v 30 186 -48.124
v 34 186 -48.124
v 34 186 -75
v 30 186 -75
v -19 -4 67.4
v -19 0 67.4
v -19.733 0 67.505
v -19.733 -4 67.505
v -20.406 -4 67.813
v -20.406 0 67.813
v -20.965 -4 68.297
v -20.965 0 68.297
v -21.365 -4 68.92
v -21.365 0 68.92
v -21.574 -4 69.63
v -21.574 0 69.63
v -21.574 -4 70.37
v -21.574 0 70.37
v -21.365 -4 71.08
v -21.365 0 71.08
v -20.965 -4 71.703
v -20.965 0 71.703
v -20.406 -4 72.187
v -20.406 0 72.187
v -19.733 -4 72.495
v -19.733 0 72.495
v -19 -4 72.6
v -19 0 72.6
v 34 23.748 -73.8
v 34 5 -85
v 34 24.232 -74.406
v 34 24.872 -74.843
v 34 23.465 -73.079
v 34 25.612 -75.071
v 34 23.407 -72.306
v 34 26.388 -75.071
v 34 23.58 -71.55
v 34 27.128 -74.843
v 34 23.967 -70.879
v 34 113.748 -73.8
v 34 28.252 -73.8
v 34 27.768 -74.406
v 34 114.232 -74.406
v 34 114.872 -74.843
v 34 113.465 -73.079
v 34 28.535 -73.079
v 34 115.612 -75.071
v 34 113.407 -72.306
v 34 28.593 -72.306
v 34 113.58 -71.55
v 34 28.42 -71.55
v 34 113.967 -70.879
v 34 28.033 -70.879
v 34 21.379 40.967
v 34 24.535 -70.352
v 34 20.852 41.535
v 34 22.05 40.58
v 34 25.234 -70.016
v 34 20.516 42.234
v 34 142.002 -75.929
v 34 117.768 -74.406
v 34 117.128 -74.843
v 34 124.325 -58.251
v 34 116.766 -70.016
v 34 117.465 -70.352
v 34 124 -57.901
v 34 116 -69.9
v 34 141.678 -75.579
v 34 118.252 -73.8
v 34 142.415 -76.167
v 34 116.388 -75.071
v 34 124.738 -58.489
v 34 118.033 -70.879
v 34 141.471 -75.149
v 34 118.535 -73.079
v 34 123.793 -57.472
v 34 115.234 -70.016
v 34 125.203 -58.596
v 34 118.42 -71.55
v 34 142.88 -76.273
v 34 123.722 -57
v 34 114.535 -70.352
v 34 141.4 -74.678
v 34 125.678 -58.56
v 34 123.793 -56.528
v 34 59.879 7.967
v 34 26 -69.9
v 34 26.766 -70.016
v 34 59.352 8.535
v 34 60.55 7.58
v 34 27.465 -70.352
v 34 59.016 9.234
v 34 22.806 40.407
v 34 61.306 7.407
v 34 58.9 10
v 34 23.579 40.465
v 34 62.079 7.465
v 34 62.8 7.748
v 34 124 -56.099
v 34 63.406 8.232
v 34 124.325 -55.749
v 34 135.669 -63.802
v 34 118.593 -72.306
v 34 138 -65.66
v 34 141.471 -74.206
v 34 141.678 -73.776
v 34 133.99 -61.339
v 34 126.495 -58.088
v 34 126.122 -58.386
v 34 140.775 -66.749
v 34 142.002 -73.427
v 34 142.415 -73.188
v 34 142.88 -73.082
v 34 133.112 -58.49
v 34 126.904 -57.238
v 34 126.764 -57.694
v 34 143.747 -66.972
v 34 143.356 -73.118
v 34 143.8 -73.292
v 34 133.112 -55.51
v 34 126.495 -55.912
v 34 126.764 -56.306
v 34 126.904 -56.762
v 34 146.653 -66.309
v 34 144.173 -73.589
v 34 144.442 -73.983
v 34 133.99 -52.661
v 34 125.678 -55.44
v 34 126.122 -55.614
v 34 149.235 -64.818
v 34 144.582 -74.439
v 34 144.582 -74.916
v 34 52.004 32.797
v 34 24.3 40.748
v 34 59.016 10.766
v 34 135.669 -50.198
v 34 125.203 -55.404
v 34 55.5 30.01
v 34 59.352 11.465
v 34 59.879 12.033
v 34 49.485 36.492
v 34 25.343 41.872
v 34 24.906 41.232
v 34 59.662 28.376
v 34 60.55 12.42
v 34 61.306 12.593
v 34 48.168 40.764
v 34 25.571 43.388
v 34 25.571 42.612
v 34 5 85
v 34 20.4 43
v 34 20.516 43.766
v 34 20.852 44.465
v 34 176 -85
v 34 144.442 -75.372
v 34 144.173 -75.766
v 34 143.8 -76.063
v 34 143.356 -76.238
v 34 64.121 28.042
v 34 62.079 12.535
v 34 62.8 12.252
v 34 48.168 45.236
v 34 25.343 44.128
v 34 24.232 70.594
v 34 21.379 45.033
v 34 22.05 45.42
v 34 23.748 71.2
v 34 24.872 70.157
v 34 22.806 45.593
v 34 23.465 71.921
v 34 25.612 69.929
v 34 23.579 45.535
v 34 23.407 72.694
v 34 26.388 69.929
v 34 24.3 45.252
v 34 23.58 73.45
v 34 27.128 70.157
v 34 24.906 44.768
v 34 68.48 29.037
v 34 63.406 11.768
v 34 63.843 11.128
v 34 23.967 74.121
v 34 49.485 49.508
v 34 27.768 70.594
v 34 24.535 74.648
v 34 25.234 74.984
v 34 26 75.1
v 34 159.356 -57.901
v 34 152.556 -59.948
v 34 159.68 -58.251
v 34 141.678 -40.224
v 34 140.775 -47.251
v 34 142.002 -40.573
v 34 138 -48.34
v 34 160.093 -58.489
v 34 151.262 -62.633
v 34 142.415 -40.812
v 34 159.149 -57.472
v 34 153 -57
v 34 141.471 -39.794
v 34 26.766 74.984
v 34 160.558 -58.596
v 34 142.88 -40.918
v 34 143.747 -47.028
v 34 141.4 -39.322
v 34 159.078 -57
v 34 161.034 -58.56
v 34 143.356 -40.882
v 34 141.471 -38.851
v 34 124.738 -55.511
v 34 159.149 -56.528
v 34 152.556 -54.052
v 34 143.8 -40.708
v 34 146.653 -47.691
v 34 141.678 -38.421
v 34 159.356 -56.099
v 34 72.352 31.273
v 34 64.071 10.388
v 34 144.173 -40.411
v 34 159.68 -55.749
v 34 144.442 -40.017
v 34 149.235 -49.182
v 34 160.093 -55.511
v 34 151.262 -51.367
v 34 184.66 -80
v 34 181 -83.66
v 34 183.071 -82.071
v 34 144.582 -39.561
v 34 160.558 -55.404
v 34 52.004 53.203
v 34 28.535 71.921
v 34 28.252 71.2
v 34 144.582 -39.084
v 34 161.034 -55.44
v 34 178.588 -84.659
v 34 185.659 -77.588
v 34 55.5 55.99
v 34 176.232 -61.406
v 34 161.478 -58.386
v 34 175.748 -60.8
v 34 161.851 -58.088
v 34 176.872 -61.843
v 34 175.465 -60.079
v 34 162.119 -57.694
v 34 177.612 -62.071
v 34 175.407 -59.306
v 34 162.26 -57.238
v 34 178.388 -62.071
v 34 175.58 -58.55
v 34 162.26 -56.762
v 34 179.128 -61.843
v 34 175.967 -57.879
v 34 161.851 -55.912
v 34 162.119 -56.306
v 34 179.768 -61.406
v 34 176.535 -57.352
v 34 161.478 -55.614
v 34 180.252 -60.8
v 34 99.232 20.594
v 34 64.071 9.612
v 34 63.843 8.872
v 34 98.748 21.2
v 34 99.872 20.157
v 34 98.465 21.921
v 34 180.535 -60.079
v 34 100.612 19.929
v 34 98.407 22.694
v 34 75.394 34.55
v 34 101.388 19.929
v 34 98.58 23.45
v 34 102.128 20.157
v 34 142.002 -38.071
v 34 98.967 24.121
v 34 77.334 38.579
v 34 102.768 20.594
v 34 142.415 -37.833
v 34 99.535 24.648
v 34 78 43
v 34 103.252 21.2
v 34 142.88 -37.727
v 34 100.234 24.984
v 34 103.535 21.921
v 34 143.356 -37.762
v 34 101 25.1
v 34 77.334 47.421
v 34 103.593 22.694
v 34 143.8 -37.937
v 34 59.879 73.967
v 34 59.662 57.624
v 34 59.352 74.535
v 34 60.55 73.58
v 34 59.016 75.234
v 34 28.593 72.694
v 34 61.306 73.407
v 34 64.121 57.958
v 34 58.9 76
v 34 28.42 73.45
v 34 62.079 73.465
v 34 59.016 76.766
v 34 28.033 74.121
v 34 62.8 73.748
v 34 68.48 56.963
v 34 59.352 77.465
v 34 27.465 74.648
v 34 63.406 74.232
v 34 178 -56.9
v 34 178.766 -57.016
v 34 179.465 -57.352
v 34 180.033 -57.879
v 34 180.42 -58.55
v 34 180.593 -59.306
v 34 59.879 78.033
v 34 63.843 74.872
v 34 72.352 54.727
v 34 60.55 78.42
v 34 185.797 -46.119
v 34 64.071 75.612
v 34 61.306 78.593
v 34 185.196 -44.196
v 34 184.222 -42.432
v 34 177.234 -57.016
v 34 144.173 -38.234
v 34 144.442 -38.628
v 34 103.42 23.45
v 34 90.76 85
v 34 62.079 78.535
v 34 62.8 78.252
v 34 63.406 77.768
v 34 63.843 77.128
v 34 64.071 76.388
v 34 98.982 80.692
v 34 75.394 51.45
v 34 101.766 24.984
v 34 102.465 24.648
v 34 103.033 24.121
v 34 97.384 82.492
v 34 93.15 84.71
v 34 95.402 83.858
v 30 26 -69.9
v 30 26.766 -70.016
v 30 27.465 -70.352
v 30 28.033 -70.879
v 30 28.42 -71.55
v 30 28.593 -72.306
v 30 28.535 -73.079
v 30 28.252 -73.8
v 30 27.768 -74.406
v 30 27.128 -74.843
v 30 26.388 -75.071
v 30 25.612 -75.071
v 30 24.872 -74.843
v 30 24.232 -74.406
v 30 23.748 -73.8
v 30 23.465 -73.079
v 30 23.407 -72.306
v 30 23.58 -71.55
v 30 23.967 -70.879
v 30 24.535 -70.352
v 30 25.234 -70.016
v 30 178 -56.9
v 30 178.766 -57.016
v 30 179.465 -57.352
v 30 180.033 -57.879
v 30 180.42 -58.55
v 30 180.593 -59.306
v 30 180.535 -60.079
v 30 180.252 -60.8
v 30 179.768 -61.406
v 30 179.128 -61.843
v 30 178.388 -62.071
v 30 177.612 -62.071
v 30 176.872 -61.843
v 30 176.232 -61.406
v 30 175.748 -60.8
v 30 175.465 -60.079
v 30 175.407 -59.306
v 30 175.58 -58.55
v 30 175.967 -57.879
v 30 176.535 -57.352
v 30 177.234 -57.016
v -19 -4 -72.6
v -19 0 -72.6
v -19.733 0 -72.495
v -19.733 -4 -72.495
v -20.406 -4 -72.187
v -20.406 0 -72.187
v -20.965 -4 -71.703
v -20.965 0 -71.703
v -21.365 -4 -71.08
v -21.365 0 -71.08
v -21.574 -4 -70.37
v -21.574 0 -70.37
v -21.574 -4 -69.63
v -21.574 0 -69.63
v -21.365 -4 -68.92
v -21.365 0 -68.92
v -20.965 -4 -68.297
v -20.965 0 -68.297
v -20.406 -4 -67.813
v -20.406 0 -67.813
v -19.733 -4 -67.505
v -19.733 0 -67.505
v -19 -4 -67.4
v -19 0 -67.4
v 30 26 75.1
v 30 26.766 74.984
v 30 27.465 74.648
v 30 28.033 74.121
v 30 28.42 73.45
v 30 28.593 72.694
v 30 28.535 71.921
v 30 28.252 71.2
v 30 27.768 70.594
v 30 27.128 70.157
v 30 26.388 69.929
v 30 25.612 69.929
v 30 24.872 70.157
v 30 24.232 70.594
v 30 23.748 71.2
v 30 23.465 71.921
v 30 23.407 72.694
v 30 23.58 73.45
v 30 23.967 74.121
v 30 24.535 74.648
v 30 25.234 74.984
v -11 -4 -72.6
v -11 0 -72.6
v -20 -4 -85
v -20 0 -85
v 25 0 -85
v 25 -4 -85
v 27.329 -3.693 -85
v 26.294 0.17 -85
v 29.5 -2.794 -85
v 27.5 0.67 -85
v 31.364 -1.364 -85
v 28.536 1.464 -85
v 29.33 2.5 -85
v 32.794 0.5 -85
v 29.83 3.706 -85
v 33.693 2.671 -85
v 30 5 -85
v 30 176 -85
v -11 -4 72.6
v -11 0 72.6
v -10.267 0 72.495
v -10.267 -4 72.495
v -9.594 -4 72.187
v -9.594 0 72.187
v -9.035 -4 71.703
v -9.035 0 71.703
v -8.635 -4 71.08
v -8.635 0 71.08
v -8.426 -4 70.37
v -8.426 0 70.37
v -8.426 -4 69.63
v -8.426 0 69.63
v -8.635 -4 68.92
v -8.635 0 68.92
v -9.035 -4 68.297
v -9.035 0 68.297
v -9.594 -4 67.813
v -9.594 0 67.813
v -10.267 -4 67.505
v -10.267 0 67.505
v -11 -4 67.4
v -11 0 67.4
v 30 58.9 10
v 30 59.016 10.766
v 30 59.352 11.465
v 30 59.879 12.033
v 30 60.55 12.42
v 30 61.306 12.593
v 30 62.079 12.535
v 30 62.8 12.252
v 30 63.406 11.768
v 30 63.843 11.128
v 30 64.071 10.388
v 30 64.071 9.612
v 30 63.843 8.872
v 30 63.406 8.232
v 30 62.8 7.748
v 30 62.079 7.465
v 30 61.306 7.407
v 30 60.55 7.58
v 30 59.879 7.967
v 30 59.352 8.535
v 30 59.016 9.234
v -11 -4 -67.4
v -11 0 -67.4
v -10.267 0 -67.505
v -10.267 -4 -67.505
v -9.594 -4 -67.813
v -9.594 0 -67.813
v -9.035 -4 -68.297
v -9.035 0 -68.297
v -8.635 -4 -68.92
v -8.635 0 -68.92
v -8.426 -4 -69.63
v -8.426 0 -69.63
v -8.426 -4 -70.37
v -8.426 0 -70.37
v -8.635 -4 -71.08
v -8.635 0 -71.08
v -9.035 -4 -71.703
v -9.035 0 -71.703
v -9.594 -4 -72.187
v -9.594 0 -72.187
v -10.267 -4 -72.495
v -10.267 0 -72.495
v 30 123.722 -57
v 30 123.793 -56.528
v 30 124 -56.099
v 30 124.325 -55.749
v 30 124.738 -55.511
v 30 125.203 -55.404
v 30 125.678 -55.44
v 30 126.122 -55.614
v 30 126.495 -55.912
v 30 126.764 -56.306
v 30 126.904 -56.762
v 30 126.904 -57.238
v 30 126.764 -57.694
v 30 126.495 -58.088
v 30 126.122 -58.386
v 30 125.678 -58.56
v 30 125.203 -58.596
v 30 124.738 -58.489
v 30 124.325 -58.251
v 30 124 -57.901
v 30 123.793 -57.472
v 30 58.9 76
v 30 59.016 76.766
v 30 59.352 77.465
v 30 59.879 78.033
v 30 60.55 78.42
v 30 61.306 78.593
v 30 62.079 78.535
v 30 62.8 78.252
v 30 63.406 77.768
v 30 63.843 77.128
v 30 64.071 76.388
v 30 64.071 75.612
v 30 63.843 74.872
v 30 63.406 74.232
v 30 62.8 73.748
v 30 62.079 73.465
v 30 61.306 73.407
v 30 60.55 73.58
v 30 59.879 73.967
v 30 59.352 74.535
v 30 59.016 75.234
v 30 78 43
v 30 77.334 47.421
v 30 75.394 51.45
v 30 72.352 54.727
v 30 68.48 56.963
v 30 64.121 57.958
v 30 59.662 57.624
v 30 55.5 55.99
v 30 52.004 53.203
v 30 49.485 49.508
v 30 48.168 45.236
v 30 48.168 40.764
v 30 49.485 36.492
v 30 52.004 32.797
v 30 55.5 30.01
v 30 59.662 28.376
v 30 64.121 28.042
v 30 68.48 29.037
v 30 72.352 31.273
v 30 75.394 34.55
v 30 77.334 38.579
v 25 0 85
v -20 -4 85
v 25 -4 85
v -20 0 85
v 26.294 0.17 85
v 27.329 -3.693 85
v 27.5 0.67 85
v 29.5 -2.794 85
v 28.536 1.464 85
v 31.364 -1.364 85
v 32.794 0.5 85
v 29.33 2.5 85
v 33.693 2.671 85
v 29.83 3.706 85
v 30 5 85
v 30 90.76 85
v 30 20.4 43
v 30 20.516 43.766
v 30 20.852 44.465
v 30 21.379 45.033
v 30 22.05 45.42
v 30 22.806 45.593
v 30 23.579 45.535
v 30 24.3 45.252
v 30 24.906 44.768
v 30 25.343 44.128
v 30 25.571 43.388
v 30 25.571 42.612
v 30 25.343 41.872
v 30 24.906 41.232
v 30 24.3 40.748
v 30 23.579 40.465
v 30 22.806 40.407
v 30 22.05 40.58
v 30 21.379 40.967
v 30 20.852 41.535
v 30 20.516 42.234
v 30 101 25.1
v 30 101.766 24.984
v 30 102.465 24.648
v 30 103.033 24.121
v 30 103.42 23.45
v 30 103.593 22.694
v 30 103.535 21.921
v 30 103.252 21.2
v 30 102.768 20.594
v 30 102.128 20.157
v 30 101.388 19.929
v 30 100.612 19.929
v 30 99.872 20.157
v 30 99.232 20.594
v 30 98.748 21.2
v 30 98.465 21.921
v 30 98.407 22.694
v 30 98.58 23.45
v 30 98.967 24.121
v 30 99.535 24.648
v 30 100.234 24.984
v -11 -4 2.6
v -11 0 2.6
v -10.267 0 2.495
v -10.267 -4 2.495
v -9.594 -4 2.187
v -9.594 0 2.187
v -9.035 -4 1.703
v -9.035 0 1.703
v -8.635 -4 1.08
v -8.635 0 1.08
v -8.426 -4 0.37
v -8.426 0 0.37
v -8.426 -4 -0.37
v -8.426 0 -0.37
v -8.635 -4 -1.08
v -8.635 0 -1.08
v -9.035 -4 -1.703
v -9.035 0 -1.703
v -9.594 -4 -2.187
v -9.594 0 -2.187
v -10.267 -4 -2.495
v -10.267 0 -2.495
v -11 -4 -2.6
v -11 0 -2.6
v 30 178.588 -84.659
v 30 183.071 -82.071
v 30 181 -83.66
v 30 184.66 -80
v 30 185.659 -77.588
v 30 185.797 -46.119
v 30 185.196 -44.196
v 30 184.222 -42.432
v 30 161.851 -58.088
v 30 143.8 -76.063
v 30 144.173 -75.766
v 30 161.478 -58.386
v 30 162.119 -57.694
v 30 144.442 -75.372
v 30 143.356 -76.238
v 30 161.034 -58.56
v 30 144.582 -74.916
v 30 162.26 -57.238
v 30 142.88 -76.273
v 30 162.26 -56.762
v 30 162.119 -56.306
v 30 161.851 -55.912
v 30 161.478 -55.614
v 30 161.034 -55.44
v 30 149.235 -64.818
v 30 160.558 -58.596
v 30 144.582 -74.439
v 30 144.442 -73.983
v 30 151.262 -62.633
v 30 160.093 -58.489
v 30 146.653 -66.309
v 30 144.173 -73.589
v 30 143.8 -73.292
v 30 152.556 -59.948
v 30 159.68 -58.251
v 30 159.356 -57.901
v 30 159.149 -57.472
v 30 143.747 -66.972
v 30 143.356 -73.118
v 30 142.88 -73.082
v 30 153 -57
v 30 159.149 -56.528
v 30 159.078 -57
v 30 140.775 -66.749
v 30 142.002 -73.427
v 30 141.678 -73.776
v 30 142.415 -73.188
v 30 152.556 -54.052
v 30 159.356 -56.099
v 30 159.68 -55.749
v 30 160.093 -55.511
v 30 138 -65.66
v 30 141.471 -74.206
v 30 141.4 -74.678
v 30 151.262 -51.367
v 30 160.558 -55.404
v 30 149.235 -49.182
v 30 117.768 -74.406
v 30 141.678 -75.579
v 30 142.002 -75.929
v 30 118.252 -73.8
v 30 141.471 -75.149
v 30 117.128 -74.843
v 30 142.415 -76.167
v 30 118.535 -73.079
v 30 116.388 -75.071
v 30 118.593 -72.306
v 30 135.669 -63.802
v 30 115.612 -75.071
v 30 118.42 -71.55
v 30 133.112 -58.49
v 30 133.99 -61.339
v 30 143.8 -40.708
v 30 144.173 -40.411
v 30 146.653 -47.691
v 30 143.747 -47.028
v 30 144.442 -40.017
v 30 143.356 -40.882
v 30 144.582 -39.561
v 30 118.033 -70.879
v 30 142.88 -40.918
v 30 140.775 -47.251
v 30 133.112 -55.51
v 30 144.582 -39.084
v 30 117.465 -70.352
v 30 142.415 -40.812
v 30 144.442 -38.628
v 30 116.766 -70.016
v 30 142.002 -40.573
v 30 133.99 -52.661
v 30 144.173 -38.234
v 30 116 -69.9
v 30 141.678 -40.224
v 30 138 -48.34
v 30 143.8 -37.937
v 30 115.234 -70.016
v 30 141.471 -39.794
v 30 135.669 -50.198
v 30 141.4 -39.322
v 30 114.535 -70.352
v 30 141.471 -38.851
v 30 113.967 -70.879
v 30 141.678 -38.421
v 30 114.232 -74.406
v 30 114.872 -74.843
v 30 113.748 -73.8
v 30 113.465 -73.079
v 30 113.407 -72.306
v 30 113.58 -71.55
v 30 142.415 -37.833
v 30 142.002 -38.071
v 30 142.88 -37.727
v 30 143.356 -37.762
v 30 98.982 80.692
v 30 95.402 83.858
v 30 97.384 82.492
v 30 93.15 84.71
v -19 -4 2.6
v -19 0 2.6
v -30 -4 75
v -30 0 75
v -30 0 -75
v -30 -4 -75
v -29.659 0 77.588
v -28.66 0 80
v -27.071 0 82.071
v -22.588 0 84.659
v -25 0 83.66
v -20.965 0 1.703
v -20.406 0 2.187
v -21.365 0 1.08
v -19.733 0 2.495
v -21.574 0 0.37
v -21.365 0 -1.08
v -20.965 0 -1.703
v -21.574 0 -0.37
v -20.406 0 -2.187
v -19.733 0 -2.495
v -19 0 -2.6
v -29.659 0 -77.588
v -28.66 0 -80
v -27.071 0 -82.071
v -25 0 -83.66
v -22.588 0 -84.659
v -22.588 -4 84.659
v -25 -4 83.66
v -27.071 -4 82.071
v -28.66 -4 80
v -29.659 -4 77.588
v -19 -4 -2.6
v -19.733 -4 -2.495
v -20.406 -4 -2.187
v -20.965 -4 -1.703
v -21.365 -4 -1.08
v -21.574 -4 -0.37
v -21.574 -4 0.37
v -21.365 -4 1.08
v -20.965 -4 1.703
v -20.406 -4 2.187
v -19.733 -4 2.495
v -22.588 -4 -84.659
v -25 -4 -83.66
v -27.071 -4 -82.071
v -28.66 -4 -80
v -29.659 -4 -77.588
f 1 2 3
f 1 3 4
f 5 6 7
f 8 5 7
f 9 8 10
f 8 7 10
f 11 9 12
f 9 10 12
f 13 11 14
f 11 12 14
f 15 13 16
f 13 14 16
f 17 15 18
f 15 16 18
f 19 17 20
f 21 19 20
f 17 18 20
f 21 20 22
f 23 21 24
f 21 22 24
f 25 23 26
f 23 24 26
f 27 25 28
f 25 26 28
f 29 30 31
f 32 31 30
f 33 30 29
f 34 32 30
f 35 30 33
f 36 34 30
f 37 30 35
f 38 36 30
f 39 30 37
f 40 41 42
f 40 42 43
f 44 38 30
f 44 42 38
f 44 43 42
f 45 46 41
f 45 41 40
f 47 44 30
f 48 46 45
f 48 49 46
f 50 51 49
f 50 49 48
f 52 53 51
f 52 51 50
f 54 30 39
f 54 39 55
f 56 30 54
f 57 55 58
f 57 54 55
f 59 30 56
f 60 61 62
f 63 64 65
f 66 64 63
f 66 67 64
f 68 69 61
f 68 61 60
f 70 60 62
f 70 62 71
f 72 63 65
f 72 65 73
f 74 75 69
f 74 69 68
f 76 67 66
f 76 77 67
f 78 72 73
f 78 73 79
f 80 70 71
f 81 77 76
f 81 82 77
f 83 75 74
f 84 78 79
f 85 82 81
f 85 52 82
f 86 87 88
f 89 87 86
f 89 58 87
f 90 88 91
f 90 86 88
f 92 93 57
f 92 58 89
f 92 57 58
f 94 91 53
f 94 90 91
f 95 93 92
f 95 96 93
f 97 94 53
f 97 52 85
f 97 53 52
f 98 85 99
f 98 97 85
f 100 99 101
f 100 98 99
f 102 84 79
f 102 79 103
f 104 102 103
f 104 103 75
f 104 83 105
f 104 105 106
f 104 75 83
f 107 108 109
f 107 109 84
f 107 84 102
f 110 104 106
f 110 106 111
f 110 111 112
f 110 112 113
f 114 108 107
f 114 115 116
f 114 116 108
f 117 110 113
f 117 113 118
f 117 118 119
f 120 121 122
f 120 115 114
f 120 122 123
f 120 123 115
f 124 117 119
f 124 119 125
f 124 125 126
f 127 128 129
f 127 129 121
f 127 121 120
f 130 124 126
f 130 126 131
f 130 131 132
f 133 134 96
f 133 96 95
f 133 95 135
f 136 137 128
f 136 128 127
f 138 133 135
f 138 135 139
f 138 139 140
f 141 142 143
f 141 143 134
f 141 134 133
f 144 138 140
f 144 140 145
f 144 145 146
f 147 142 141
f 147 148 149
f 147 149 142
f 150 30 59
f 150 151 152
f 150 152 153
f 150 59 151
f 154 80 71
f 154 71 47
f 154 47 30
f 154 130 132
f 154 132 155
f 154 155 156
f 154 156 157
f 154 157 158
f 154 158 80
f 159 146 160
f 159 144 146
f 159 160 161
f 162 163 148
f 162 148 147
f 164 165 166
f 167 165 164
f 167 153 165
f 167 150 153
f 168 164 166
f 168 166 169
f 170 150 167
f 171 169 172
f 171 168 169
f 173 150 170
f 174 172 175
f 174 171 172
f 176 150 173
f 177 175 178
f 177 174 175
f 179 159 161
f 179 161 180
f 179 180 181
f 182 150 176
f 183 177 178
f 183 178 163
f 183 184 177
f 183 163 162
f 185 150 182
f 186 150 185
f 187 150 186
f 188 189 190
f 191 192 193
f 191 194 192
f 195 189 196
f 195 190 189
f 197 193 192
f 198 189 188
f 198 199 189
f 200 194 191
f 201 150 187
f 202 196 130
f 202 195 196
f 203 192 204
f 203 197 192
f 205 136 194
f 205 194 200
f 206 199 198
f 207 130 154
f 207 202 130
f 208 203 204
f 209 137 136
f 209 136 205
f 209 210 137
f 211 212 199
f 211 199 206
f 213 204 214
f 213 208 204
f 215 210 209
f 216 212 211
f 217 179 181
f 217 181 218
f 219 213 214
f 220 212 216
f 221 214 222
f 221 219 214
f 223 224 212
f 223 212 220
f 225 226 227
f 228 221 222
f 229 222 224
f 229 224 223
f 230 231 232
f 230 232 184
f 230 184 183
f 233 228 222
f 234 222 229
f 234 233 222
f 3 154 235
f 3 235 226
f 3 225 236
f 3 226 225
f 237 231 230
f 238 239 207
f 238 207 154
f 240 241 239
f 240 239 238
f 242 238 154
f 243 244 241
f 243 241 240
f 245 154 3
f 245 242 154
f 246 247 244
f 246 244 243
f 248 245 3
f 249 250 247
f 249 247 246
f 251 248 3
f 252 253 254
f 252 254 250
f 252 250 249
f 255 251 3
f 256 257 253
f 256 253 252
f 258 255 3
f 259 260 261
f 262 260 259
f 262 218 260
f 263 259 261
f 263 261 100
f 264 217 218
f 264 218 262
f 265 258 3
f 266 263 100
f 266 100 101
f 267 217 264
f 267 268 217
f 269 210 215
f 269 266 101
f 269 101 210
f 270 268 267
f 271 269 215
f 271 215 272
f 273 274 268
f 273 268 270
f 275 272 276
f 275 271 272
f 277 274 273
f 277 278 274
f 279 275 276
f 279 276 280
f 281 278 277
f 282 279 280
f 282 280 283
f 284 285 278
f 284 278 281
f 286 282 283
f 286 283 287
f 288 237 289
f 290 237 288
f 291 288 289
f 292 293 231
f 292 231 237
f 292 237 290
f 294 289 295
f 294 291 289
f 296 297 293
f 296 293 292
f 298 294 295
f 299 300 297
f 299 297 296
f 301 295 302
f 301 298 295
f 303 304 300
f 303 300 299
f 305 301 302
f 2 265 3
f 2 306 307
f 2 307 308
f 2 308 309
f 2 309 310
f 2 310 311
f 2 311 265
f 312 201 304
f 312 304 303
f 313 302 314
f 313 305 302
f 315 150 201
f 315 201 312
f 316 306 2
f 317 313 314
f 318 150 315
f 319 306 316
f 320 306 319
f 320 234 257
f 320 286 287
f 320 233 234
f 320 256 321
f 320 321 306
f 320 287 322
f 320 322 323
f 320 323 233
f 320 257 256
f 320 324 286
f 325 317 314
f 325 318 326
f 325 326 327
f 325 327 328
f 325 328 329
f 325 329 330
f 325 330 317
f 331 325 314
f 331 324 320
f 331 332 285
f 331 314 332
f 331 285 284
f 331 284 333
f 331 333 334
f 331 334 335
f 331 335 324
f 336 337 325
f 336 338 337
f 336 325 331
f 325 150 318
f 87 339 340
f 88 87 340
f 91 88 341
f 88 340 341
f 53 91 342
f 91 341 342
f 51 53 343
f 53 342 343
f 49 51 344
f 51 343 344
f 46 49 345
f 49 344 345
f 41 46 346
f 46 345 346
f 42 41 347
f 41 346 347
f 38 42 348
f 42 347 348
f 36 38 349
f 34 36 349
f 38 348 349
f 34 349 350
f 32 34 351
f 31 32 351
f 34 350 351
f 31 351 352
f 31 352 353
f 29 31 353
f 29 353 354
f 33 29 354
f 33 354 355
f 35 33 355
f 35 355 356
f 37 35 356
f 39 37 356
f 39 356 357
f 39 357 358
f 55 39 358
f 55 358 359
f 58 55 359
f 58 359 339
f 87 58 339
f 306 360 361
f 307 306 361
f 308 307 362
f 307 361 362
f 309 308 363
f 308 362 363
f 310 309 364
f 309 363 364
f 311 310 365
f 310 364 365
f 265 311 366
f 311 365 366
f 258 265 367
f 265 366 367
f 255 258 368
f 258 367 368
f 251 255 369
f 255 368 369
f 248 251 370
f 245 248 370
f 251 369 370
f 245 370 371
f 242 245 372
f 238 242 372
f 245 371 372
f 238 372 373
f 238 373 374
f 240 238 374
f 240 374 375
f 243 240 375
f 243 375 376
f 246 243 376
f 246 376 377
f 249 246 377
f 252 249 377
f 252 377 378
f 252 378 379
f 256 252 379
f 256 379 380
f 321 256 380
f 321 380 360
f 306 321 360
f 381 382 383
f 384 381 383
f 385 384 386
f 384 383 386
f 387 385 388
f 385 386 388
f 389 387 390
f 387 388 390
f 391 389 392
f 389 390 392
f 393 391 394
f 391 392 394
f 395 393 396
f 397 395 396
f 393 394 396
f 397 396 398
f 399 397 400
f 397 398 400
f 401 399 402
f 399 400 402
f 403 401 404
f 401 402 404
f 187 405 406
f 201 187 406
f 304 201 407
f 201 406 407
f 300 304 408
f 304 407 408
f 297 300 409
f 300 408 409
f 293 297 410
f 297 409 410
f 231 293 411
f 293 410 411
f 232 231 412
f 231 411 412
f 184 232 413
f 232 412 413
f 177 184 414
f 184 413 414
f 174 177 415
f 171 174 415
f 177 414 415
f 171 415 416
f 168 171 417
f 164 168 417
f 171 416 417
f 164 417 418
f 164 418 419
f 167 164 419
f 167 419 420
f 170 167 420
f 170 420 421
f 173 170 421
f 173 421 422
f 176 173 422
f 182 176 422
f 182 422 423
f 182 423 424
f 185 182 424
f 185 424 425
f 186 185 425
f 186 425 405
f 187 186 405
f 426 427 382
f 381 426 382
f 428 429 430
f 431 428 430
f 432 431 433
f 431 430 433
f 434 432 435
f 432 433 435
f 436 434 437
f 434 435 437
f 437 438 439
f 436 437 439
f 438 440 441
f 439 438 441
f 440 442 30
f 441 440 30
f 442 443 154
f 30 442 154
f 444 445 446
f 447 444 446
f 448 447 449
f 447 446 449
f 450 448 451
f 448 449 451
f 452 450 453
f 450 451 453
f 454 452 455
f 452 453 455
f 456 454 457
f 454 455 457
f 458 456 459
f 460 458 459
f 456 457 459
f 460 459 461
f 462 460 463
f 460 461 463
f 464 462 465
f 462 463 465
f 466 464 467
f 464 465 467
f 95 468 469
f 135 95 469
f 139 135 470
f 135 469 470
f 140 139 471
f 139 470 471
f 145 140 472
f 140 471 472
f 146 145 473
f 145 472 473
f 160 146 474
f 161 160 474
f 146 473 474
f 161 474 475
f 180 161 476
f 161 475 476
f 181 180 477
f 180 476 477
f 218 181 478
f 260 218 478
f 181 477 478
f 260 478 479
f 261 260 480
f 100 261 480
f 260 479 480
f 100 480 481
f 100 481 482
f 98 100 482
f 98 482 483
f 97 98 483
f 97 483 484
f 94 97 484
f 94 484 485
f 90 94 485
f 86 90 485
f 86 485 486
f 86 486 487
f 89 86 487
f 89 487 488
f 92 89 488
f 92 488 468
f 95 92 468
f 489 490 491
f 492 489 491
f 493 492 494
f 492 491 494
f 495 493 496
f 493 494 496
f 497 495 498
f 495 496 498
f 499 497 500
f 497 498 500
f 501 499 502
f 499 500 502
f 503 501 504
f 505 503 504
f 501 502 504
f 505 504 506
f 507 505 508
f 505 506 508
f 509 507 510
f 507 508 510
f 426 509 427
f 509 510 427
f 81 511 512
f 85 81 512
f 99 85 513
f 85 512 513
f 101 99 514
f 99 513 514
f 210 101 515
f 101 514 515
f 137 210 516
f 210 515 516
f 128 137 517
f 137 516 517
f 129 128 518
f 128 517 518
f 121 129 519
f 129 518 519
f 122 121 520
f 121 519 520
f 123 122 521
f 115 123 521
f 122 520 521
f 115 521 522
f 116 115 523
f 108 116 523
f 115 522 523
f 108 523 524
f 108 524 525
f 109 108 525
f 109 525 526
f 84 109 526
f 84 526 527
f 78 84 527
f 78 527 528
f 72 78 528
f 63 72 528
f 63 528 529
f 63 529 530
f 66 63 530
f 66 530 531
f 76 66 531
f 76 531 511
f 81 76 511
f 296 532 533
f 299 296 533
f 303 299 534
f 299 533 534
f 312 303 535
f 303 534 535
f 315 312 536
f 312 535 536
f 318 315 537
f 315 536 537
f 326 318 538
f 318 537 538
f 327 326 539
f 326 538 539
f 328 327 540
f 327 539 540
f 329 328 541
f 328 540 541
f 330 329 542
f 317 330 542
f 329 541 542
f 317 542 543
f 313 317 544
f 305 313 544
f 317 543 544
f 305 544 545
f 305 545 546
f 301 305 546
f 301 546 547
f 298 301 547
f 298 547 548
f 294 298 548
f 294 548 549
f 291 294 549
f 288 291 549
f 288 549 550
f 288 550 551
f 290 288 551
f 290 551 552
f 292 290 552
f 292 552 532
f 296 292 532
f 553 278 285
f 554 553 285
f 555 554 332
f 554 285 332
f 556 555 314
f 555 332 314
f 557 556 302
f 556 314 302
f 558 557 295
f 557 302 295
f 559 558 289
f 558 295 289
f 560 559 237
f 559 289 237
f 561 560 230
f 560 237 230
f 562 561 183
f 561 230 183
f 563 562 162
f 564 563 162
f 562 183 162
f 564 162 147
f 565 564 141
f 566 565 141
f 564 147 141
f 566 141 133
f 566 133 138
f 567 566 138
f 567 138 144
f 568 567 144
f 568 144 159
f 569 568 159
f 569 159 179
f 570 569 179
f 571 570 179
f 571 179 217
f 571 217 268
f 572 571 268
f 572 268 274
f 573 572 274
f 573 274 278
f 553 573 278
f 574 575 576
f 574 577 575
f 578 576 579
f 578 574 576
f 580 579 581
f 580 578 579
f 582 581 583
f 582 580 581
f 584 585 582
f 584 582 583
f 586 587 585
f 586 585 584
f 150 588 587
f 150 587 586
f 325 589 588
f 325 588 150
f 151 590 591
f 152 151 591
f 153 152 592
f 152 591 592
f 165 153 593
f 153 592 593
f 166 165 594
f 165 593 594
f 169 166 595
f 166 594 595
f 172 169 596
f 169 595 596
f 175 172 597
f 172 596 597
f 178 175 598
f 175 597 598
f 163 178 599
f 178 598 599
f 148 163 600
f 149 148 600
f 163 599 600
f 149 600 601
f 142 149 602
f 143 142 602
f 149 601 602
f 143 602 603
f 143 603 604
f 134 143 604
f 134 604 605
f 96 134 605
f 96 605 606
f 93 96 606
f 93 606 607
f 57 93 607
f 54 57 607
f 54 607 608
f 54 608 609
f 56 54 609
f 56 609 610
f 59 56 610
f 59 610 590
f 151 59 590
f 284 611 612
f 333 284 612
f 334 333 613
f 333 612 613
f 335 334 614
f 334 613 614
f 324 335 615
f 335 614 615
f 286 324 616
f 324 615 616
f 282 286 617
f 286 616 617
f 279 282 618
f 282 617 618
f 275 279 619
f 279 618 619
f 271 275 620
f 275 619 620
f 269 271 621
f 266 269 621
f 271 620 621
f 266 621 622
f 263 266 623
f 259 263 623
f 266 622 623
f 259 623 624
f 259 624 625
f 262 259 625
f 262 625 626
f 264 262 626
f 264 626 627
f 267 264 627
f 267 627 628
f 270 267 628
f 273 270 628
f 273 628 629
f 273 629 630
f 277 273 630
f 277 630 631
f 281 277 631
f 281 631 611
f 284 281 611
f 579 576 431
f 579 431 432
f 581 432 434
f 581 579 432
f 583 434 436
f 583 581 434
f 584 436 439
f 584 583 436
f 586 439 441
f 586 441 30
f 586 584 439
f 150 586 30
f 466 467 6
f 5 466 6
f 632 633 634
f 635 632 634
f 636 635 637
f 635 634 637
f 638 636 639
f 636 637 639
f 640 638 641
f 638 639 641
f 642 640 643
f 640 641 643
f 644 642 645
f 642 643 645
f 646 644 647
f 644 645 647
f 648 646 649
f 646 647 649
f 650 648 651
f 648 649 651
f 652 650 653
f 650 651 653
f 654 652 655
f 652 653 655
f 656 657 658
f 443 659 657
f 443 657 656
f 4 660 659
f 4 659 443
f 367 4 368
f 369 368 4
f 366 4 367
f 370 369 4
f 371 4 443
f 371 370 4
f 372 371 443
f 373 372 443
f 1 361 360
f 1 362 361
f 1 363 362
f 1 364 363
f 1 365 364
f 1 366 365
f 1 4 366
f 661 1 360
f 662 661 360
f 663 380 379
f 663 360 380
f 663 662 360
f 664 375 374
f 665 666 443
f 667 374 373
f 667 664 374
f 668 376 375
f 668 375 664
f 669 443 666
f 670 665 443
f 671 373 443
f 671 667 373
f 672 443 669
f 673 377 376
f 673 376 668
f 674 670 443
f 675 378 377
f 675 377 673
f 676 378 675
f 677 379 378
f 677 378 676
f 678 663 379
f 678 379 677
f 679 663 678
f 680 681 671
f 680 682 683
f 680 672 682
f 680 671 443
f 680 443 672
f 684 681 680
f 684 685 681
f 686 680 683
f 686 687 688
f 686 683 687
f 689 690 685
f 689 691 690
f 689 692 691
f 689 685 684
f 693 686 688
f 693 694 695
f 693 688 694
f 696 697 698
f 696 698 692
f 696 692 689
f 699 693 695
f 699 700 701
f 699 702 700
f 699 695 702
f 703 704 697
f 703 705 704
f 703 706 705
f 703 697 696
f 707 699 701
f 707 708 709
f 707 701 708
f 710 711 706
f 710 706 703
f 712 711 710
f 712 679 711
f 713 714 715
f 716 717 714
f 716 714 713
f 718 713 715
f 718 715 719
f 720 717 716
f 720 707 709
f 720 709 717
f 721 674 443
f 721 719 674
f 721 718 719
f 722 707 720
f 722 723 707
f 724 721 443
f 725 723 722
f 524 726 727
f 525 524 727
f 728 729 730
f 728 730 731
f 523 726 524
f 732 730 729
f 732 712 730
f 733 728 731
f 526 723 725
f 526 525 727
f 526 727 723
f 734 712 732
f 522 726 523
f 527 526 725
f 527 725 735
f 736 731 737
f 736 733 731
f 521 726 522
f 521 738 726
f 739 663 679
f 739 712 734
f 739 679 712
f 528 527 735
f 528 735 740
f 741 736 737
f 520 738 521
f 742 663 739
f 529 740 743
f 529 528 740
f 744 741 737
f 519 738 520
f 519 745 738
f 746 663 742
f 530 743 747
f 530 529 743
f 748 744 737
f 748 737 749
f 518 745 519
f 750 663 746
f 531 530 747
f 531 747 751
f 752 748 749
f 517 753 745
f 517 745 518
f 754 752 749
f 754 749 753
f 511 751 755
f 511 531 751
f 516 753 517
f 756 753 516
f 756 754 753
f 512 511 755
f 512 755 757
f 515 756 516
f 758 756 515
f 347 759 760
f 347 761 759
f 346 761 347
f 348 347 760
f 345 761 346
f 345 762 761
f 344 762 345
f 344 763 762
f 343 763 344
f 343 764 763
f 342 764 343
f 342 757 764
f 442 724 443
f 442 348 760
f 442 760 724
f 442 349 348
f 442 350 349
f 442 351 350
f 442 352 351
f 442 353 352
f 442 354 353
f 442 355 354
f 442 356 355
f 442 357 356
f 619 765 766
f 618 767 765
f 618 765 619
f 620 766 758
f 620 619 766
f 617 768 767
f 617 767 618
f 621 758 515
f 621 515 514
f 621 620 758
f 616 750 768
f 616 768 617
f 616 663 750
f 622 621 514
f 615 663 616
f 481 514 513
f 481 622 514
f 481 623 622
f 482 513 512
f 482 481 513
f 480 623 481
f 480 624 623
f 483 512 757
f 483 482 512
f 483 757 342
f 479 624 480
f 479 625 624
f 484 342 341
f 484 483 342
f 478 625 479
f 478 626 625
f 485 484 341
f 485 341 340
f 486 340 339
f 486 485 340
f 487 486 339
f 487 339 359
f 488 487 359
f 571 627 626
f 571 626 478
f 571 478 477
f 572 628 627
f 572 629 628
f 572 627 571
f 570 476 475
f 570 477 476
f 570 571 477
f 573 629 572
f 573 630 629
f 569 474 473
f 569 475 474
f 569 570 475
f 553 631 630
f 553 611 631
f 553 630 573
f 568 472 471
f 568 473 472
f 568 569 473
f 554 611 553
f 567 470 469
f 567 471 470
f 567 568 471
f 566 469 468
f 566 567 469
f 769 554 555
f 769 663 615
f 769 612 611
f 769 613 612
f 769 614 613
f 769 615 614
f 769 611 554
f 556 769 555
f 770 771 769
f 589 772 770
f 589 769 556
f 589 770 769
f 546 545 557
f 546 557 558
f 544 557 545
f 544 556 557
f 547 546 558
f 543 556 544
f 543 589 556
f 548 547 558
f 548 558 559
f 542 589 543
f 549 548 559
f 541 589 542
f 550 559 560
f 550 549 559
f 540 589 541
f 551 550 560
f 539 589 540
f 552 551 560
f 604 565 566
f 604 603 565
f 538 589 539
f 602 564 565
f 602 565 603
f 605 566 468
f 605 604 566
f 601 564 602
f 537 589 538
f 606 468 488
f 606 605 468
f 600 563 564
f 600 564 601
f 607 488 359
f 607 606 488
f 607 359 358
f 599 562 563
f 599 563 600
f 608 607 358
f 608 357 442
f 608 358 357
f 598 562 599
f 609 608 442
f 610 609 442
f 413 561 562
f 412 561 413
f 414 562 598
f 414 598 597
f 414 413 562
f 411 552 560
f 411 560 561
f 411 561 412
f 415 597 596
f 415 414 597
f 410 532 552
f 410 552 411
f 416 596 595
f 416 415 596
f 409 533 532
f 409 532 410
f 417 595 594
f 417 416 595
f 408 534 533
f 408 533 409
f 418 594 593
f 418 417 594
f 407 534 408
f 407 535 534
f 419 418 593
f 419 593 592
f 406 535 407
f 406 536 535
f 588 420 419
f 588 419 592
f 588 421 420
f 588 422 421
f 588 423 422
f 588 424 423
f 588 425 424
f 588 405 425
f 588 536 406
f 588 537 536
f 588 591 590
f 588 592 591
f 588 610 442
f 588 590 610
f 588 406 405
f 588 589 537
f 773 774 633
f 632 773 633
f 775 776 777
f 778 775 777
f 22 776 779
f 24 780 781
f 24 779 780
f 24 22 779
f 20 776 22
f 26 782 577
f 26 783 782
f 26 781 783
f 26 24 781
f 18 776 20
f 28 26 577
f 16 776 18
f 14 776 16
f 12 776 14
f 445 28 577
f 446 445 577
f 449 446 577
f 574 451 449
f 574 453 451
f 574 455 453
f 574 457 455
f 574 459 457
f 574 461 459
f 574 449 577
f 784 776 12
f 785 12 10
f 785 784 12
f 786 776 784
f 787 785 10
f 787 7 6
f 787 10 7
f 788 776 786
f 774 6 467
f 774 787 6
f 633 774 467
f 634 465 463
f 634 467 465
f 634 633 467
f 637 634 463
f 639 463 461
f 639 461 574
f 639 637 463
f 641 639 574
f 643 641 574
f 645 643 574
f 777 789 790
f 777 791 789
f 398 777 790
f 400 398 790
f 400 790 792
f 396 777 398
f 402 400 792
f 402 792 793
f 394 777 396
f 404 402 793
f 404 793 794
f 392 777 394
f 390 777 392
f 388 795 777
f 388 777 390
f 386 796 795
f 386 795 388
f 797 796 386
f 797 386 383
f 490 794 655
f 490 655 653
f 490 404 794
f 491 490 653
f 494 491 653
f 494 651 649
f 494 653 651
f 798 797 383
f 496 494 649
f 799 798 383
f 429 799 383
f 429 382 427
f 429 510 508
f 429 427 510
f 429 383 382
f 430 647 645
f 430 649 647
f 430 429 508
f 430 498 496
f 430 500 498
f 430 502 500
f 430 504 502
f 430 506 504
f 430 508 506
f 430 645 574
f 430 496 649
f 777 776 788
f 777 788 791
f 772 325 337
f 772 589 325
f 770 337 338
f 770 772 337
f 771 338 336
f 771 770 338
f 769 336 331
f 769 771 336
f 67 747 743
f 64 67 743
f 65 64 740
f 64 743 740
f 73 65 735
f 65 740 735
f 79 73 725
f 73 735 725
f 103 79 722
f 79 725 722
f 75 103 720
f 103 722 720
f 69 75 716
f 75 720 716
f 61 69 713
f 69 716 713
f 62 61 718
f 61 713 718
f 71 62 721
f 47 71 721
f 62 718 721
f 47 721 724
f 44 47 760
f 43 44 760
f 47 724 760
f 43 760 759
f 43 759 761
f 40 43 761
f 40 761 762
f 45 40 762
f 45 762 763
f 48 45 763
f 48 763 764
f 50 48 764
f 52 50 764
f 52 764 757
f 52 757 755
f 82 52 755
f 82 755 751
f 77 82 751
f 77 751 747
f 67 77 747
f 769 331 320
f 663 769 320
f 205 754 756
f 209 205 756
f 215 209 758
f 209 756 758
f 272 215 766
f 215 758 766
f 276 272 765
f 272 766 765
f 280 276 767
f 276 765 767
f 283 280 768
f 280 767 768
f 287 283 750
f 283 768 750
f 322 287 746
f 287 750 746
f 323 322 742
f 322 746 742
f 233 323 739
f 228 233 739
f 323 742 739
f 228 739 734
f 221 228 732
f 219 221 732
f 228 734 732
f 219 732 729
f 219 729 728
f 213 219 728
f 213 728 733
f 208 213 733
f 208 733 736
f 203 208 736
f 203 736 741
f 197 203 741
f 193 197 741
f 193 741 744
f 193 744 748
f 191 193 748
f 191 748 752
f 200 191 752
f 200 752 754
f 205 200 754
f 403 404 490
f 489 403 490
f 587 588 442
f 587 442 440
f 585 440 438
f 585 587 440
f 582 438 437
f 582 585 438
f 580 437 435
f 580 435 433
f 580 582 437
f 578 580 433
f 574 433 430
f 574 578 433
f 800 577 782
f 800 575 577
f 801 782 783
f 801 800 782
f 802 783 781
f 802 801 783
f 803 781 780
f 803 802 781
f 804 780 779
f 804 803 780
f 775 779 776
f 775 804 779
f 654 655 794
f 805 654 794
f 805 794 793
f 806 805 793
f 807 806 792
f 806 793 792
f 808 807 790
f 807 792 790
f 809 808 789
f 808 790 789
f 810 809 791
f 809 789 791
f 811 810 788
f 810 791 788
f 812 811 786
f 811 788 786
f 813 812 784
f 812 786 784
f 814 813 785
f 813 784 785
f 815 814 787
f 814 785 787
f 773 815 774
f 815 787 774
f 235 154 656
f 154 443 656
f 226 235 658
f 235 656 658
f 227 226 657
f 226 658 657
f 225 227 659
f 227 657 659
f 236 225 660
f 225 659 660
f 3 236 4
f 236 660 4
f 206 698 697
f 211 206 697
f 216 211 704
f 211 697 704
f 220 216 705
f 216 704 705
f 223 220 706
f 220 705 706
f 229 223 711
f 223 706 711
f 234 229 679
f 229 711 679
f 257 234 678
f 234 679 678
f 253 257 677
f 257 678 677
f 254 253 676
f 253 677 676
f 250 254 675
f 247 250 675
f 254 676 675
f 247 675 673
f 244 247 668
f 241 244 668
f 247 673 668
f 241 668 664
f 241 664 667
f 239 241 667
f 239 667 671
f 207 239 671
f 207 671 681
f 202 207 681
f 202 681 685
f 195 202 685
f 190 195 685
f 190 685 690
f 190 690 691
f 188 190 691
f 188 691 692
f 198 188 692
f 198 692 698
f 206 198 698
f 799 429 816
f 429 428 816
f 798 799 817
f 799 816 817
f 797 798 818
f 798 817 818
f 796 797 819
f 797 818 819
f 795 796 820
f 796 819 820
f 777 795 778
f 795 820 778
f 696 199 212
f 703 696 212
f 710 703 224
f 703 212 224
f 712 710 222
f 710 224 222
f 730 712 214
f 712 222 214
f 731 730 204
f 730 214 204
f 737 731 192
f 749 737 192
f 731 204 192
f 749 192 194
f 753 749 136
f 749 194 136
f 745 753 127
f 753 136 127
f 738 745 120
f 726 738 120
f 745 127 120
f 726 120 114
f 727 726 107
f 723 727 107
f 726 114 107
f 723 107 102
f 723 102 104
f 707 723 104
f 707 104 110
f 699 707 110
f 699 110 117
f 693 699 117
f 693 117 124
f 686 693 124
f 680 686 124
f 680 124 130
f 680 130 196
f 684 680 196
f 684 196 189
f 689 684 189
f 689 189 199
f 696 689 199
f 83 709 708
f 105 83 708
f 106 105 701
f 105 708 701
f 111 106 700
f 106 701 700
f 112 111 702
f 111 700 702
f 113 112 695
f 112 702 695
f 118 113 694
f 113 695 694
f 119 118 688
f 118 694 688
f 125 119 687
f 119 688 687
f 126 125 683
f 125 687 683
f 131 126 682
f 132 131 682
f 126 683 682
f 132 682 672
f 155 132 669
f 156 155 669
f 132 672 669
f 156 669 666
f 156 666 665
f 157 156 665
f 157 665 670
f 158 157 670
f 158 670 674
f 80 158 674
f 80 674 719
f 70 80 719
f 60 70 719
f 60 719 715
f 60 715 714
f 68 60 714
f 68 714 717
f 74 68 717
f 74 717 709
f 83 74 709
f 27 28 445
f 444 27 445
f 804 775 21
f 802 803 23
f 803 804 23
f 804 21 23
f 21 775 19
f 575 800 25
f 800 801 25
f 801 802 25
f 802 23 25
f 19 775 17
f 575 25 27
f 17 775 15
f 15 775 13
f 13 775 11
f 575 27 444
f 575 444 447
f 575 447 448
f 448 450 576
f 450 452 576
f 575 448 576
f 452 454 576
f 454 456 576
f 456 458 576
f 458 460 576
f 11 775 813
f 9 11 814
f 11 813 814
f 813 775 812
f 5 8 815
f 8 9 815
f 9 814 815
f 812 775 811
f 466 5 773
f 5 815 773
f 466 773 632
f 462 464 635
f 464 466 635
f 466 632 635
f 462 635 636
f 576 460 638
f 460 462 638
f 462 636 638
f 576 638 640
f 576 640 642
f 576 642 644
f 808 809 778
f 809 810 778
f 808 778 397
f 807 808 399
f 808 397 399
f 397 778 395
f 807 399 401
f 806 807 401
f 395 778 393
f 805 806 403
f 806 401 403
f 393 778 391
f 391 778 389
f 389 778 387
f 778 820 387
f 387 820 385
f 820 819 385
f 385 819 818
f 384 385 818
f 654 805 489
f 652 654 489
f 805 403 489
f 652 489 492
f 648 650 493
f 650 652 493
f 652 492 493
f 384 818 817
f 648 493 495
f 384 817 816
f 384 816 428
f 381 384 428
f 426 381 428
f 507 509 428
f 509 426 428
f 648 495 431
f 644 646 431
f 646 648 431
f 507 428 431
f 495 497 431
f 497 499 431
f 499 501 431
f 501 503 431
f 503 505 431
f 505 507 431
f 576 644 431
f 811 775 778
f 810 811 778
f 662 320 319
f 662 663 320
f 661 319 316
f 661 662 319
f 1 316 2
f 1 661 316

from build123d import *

# Parameters (mm, degrees)
SKETCH1_W                    = 60
SKETCH1_H                    = 170
BASE_FLANGE1_DEPTH           = 4
EDGE_FLANGE1_STRIP_W         = 26
EDGE_FLANGE1_STRIP_H         = 4
EDGE_FLANGE1_STRIP_CUT_DEPTH = 170
EDGE_FLANGE1_DEPTH           = 170
SKETCH15_R                   = 15
SKETCH15_R_2                 = 10
CUT_EXTRUDE4_DEPTH           = 10
CUT_EXTRUDE5_DEPTH           = 10
SKETCH31_R                   = 2.6
CUT_EXTRUDE9_DEPTH           = 7
FILLET1_R                    = 10
SKETCH32_R                   = 1.6
CUT_EXTRUDE10_DEPTH          = 10
F_1_0MM_DOWEL_HOLE2_D        = 5.2
F_1_0MM_DOWEL_HOLE2_DEPTH    = 12.03
F_1_0MM_DOWEL_HOLE2_TIP      = 1.562237609
F_1_0MM_DOWEL_HOLE3_D        = 5.2
F_1_0MM_DOWEL_HOLE3_DEPTH    = 12.03
F_1_0MM_DOWEL_HOLE3_TIP      = 1.562237609
CUT_EXTRUDE11_DEPTH          = 10


# Sheet-metal steps are written as plain solids
with BuildPart() as part:
    # Sketch1 → Base-Flange1 (new body)
    with BuildSketch(Plane(origin=(0, 0, 0), x_dir=(1, 0, 0), z_dir=(0, 1, 0))):
        Rectangle(SKETCH1_W, SKETCH1_H)
    extrude(amount=-BASE_FLANGE1_DEPTH)

    # Edge-Flange1 strip (across the edge) → Edge-Flange1 strip cut (cut)
    with BuildSketch(Plane(origin=(30, 0, 85), x_dir=(-1, 0, 0), z_dir=(0, 0, -1))):
        with Locations((-8, -2)):
            Rectangle(EDGE_FLANGE1_STRIP_W, EDGE_FLANGE1_STRIP_H)
    extrude(amount=EDGE_FLANGE1_STRIP_CUT_DEPTH, mode=Mode.SUBTRACT)

    # Edge-Flange1 section (across the edge) → Edge-Flange1 (add)
    with BuildSketch(Plane(origin=(30, 0, 85), x_dir=(-1, 0, 0), z_dir=(0, 0, -1))):
        with BuildLine():
            Line((-4, 5), (-4, 186))
            Line((-4, 186), (0, 186))
            Line((0, 186), (0, 5))
            ThreePointArc((0, 5), (1.464466094, 1.464466094), (5, 0))
            Line((5, 0), (5, -4))
            ThreePointArc((5, -4), (-1.363961031, -1.363961031), (-4, 5))
        make_face()
    extrude(amount=EDGE_FLANGE1_DEPTH)

    # Sketch15 → Cut-Extrude4 (cut)
    with BuildSketch(Plane(origin=(34, 0, 0), x_dir=(0, 0, -1), z_dir=(1, 0, 0))):
        with Locations(Location((-43, 63, 0), (0, 0, 90))):
            Circle(SKETCH15_R)
        with Locations(Location((57, 143, 0), (0, 0, 90))):
            Circle(SKETCH15_R_2)
    extrude(amount=-CUT_EXTRUDE4_DEPTH, mode=Mode.SUBTRACT)

    # Sketch16 → Cut-Extrude5 (cut)
    with BuildSketch(Plane(origin=(34, 0, 0), x_dir=(0, 0, -1), z_dir=(1, 0, 0))):
        Polygon((-85, 186), (-85, 96), (45, 186), align=None)
    extrude(amount=-CUT_EXTRUDE5_DEPTH, mode=Mode.SUBTRACT)

    # Sketch31 → Cut-Extrude9 (cut)
    with BuildSketch(Plane.ZY.offset(-30)):
        with Locations(Location((76, 61.5, 0), (0, 0, 270))):
            Circle(SKETCH31_R)
        with Locations(Location((10, 61.5, 0), (0, 0, 270))):
            Circle(SKETCH31_R)
        with Locations(Location((43, 23, 0), (0, 0, 270))):
            Circle(SKETCH31_R)
    extrude(amount=-CUT_EXTRUDE9_DEPTH, mode=Mode.SUBTRACT)

    # Fillet1
    fillet1_edges = [part.edges().sort_by_distance(p)[0] for p in [
        (32, 186, -85),
        (32, 186, -45),
        (32, 96, 85),
        (-30, -2, 85),
        (-30, -2, -85),
    ]]
    fillet(fillet1_edges, radius=FILLET1_R)

    # Sketch32 → Cut-Extrude10 (cut)
    with BuildSketch(Plane.ZY.offset(-30)):
        with Locations(Location((-74.67766953, 143, 0), (0, 0, 270))):
            Circle(SKETCH32_R)
        with Locations(Location((-57, 125.32233047, 0), (0, 0, 270))):
            Circle(SKETCH32_R)
        with Locations(Location((-39.32233047, 143, 0), (0, 0, 270))):
            Circle(SKETCH32_R)
        with Locations(Location((-57, 160.67766953, 0), (0, 0, 270))):
            Circle(SKETCH32_R)
    extrude(amount=-CUT_EXTRUDE10_DEPTH, mode=Mode.SUBTRACT)

    # Ø1.0mm Dowel Hole2
    with Locations(Plane(origin=(34, 0, 0), x_dir=(0, 0, -1), z_dir=(1, 0, 0))):
        with Locations((-72.5, 26), (72.5, 26), (72.5, 116), (-22.5, 101), (59.5, 178)):
            Hole(F_1_0MM_DOWEL_HOLE2_D / 2, depth=F_1_0MM_DOWEL_HOLE2_DEPTH)
            with Locations((0, 0, -(F_1_0MM_DOWEL_HOLE2_DEPTH + F_1_0MM_DOWEL_HOLE2_TIP / 2))):  # 118° drill point
                Cone(0, F_1_0MM_DOWEL_HOLE2_D / 2, F_1_0MM_DOWEL_HOLE2_TIP, mode=Mode.SUBTRACT)

    # Ø1.0mm Dowel Hole3
    with Locations(Plane(origin=(0, 0, 0), x_dir=(1, 0, 0), z_dir=(0, 1, 0))):
        with Locations((-15, 70), (-15, 0), (-15, -70)):
            Hole(F_1_0MM_DOWEL_HOLE3_D / 2, depth=F_1_0MM_DOWEL_HOLE3_DEPTH)
            with Locations((0, 0, -(F_1_0MM_DOWEL_HOLE3_DEPTH + F_1_0MM_DOWEL_HOLE3_TIP / 2))):  # 118° drill point
                Cone(0, F_1_0MM_DOWEL_HOLE3_D / 2, F_1_0MM_DOWEL_HOLE3_TIP, mode=Mode.SUBTRACT)

    # Sketch40 → Cut-Extrude11 (cut)
    with BuildSketch(Plane(origin=(0, 0, 0), x_dir=(1, 0, 0), z_dir=(0, 1, 0))):
        with BuildLine():
            Line((-19, -72.6), (-11, -72.6))
            ThreePointArc((-11, -72.6), (-8.4, -70), (-11, -67.4))
            Line((-11, -67.4), (-19, -67.4))
            ThreePointArc((-19, -67.4), (-21.6, -70), (-19, -72.6))
        make_face()
        with BuildLine():
            Line((-19, -2.6), (-11, -2.6))
            ThreePointArc((-11, -2.6), (-8.4, 0), (-11, 2.6))
            Line((-11, 2.6), (-19, 2.6))
            ThreePointArc((-19, 2.6), (-21.6, 0), (-19, -2.6))
        make_face()
        with BuildLine():
            Line((-19, 67.4), (-11, 67.4))
            ThreePointArc((-11, 67.4), (-8.4, 70), (-11, 72.6))
            Line((-11, 72.6), (-19, 72.6))
            ThreePointArc((-19, 72.6), (-21.6, 70), (-19, 67.4))
        make_face()
    extrude(amount=-CUT_EXTRUDE11_DEPTH, mode=Mode.SUBTRACT)


solid = part.part
